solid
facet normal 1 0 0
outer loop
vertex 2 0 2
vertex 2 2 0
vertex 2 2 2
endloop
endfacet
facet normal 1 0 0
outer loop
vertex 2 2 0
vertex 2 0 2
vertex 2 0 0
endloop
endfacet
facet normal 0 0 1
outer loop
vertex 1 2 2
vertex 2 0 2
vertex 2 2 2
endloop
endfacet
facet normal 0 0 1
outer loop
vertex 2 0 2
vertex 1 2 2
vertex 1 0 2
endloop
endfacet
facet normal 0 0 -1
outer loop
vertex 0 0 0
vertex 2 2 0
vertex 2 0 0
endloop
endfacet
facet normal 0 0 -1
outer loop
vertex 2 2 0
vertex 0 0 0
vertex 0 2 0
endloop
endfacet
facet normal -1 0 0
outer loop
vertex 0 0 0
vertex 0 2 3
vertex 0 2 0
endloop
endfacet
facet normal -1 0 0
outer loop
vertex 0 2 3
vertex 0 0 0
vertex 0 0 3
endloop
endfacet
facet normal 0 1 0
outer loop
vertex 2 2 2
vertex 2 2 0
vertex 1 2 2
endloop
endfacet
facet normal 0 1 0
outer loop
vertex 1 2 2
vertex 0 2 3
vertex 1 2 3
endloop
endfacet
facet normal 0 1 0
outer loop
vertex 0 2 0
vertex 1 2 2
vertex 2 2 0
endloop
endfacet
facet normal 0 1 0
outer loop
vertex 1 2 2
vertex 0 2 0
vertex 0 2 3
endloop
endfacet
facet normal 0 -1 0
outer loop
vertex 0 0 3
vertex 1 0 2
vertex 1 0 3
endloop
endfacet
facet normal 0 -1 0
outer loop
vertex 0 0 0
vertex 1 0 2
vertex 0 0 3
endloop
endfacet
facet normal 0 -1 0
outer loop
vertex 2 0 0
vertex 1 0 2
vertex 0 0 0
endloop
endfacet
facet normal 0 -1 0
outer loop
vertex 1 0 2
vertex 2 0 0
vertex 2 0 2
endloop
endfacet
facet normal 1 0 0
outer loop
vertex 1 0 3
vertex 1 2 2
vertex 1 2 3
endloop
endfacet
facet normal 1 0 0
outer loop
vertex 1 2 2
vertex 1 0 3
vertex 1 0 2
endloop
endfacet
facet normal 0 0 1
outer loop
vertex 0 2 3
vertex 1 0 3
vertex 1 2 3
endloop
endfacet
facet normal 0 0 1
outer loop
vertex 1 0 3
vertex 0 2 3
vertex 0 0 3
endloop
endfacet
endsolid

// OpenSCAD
scale(2) cube();
scale([1, 2, 3]) cube();
scale([1, 2]) cube();
scale(0) cube();
scale([0 * -1, 1, 1]) cube();
scale("x") cube();
